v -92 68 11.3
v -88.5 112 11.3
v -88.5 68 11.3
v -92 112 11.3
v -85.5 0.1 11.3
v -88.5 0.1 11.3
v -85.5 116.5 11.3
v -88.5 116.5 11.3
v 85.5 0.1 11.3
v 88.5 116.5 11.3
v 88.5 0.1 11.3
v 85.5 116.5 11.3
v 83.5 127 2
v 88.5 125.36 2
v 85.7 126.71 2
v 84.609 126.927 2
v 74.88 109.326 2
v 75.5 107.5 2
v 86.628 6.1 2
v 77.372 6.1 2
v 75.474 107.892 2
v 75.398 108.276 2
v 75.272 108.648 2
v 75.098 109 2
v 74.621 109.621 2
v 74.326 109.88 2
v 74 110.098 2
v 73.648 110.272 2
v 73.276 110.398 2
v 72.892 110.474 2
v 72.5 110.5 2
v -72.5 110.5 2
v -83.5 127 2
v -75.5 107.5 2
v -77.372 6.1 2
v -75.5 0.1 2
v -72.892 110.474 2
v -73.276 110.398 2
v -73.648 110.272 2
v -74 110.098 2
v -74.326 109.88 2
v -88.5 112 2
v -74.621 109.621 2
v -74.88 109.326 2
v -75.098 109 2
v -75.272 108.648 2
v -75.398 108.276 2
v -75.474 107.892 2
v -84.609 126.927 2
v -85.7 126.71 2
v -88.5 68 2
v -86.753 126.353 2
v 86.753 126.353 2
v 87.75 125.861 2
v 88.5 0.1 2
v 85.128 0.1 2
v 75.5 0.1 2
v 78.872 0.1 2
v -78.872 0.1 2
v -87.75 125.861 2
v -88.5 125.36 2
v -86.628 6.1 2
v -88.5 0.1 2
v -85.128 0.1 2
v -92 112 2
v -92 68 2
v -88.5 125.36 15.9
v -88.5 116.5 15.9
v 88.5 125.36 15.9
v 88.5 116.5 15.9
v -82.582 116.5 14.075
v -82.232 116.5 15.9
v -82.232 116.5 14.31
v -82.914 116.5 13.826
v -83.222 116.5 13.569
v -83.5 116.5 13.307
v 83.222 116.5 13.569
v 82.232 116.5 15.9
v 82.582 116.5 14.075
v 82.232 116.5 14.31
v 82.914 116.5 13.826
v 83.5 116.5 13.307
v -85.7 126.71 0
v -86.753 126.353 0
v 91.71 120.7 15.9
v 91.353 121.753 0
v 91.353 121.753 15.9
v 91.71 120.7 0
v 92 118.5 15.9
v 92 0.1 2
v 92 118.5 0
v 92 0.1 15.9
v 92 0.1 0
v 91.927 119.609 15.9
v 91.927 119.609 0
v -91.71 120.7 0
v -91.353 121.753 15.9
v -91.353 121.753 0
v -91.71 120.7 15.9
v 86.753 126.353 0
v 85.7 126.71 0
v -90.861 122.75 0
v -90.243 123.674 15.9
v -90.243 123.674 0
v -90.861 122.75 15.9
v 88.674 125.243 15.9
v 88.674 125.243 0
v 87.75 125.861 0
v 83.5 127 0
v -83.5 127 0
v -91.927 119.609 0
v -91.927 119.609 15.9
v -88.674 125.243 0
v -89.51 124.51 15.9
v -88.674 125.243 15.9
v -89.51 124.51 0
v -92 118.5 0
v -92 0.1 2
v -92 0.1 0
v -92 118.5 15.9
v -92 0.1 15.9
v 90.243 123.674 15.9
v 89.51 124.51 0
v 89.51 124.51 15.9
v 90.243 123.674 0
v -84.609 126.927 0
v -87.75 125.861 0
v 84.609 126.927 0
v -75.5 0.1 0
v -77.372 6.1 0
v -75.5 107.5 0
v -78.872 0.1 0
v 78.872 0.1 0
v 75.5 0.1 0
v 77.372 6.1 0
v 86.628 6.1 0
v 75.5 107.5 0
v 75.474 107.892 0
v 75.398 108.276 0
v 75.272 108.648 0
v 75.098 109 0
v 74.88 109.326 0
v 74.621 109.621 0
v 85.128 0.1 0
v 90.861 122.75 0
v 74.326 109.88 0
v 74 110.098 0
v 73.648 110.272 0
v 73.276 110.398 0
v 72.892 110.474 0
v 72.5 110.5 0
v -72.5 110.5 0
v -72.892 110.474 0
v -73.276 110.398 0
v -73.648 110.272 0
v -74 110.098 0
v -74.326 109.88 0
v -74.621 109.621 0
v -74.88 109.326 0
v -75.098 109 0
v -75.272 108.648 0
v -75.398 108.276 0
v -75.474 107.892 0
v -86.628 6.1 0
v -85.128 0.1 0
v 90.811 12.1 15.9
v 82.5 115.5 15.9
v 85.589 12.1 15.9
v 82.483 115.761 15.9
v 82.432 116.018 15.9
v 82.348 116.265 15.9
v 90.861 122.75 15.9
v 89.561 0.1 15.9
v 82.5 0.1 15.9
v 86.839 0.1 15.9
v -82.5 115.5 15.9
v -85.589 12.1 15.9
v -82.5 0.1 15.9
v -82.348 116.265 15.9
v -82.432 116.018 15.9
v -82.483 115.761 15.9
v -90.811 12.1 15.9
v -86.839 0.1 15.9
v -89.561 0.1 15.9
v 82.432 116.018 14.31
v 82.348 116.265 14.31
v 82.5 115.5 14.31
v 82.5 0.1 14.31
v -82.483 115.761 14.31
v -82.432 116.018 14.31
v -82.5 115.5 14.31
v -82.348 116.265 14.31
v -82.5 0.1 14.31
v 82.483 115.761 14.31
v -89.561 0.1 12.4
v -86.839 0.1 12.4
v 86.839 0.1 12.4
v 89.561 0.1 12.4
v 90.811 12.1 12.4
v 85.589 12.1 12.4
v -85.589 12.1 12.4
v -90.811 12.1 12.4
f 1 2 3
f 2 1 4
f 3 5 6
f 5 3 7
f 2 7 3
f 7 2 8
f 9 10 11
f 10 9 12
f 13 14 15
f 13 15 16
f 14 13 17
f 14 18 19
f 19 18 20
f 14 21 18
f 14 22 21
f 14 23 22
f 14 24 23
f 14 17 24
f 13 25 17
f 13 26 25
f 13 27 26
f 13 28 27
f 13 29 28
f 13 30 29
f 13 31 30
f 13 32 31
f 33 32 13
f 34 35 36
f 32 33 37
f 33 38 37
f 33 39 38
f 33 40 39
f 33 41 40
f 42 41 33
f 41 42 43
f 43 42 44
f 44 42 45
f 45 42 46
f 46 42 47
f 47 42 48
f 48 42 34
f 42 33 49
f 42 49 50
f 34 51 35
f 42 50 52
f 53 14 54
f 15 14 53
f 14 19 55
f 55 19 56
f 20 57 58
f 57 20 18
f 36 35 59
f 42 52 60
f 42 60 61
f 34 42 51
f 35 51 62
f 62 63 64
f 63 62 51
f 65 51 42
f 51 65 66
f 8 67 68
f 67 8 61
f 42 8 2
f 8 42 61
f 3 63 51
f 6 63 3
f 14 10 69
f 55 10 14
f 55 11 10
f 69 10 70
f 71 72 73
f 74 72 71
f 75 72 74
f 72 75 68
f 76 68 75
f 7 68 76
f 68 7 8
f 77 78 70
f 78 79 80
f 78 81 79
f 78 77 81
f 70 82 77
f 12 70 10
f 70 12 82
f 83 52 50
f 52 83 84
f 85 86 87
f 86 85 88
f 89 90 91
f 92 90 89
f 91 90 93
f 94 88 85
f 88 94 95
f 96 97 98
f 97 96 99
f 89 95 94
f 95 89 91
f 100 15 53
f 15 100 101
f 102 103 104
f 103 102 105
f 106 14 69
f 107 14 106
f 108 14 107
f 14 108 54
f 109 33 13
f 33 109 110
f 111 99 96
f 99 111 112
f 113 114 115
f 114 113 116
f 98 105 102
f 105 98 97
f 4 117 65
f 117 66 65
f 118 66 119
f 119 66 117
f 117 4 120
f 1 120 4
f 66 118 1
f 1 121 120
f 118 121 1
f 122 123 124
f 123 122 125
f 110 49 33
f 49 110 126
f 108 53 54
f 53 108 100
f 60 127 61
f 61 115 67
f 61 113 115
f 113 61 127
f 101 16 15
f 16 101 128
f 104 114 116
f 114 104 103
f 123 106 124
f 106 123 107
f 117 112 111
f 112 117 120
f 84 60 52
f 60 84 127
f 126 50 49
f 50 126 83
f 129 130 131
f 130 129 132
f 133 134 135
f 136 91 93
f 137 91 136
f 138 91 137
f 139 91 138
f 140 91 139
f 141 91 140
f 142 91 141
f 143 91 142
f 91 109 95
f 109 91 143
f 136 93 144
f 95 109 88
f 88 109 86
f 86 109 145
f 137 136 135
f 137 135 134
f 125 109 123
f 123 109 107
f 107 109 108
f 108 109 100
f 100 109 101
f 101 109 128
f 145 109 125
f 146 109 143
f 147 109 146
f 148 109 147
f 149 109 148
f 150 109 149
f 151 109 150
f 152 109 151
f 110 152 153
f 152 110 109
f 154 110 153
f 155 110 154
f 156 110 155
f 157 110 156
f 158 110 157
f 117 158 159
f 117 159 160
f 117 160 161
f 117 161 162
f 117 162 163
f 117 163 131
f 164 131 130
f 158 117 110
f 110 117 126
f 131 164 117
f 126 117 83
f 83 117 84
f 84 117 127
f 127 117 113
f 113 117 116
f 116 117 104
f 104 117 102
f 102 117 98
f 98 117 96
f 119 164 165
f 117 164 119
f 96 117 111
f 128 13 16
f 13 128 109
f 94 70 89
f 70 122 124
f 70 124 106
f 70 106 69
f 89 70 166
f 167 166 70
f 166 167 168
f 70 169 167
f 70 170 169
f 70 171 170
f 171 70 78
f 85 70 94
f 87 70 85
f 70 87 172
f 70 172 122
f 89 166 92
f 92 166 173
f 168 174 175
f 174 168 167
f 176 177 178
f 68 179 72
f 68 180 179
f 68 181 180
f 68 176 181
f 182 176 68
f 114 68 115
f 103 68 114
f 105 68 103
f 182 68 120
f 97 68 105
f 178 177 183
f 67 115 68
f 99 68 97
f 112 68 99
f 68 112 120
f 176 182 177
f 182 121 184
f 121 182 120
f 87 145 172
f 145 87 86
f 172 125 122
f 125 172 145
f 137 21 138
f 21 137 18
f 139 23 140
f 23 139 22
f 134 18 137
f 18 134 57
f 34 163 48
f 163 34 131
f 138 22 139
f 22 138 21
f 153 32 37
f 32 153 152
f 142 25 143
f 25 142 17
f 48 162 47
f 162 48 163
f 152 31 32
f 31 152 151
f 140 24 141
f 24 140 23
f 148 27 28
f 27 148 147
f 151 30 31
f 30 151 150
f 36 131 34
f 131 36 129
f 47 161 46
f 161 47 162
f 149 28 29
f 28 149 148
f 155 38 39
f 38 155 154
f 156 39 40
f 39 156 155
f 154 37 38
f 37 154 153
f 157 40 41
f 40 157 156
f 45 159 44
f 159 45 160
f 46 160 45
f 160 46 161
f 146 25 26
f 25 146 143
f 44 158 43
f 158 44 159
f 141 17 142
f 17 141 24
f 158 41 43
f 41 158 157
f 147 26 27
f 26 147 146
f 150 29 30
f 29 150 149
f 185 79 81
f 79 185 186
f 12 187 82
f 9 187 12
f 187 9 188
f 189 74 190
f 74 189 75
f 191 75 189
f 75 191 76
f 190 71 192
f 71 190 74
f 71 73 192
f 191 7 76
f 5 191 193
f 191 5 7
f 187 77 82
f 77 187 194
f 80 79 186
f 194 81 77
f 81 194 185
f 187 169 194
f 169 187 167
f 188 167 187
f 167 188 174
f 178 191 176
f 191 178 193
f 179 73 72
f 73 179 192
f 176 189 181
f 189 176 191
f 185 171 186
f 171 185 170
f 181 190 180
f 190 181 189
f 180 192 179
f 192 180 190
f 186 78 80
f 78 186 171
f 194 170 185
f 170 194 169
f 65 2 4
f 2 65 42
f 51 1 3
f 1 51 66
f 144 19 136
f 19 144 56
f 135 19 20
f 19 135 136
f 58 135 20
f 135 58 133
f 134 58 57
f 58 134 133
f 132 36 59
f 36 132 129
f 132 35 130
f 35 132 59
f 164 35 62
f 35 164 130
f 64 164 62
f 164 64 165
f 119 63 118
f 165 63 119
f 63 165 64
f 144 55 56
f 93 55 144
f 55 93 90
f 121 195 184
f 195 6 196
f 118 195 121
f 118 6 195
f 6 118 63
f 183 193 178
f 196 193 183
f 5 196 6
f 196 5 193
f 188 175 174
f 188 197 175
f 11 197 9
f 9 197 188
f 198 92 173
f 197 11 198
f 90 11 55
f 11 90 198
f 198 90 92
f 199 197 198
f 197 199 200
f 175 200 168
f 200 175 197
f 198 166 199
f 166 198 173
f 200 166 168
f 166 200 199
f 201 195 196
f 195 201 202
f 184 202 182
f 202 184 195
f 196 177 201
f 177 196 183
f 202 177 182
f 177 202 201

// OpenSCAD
// Top half of the portrait Surface Go window frame, for a 256 mm bed (Bambu A1/P1/X1).
// Print front face down, no supports. Glue to the other half at the dovetails.
// Dimensions come from ../surface-go-window-frame.scad.
use <../surface-go-window-frame.scad>

frame_portrait_top();
